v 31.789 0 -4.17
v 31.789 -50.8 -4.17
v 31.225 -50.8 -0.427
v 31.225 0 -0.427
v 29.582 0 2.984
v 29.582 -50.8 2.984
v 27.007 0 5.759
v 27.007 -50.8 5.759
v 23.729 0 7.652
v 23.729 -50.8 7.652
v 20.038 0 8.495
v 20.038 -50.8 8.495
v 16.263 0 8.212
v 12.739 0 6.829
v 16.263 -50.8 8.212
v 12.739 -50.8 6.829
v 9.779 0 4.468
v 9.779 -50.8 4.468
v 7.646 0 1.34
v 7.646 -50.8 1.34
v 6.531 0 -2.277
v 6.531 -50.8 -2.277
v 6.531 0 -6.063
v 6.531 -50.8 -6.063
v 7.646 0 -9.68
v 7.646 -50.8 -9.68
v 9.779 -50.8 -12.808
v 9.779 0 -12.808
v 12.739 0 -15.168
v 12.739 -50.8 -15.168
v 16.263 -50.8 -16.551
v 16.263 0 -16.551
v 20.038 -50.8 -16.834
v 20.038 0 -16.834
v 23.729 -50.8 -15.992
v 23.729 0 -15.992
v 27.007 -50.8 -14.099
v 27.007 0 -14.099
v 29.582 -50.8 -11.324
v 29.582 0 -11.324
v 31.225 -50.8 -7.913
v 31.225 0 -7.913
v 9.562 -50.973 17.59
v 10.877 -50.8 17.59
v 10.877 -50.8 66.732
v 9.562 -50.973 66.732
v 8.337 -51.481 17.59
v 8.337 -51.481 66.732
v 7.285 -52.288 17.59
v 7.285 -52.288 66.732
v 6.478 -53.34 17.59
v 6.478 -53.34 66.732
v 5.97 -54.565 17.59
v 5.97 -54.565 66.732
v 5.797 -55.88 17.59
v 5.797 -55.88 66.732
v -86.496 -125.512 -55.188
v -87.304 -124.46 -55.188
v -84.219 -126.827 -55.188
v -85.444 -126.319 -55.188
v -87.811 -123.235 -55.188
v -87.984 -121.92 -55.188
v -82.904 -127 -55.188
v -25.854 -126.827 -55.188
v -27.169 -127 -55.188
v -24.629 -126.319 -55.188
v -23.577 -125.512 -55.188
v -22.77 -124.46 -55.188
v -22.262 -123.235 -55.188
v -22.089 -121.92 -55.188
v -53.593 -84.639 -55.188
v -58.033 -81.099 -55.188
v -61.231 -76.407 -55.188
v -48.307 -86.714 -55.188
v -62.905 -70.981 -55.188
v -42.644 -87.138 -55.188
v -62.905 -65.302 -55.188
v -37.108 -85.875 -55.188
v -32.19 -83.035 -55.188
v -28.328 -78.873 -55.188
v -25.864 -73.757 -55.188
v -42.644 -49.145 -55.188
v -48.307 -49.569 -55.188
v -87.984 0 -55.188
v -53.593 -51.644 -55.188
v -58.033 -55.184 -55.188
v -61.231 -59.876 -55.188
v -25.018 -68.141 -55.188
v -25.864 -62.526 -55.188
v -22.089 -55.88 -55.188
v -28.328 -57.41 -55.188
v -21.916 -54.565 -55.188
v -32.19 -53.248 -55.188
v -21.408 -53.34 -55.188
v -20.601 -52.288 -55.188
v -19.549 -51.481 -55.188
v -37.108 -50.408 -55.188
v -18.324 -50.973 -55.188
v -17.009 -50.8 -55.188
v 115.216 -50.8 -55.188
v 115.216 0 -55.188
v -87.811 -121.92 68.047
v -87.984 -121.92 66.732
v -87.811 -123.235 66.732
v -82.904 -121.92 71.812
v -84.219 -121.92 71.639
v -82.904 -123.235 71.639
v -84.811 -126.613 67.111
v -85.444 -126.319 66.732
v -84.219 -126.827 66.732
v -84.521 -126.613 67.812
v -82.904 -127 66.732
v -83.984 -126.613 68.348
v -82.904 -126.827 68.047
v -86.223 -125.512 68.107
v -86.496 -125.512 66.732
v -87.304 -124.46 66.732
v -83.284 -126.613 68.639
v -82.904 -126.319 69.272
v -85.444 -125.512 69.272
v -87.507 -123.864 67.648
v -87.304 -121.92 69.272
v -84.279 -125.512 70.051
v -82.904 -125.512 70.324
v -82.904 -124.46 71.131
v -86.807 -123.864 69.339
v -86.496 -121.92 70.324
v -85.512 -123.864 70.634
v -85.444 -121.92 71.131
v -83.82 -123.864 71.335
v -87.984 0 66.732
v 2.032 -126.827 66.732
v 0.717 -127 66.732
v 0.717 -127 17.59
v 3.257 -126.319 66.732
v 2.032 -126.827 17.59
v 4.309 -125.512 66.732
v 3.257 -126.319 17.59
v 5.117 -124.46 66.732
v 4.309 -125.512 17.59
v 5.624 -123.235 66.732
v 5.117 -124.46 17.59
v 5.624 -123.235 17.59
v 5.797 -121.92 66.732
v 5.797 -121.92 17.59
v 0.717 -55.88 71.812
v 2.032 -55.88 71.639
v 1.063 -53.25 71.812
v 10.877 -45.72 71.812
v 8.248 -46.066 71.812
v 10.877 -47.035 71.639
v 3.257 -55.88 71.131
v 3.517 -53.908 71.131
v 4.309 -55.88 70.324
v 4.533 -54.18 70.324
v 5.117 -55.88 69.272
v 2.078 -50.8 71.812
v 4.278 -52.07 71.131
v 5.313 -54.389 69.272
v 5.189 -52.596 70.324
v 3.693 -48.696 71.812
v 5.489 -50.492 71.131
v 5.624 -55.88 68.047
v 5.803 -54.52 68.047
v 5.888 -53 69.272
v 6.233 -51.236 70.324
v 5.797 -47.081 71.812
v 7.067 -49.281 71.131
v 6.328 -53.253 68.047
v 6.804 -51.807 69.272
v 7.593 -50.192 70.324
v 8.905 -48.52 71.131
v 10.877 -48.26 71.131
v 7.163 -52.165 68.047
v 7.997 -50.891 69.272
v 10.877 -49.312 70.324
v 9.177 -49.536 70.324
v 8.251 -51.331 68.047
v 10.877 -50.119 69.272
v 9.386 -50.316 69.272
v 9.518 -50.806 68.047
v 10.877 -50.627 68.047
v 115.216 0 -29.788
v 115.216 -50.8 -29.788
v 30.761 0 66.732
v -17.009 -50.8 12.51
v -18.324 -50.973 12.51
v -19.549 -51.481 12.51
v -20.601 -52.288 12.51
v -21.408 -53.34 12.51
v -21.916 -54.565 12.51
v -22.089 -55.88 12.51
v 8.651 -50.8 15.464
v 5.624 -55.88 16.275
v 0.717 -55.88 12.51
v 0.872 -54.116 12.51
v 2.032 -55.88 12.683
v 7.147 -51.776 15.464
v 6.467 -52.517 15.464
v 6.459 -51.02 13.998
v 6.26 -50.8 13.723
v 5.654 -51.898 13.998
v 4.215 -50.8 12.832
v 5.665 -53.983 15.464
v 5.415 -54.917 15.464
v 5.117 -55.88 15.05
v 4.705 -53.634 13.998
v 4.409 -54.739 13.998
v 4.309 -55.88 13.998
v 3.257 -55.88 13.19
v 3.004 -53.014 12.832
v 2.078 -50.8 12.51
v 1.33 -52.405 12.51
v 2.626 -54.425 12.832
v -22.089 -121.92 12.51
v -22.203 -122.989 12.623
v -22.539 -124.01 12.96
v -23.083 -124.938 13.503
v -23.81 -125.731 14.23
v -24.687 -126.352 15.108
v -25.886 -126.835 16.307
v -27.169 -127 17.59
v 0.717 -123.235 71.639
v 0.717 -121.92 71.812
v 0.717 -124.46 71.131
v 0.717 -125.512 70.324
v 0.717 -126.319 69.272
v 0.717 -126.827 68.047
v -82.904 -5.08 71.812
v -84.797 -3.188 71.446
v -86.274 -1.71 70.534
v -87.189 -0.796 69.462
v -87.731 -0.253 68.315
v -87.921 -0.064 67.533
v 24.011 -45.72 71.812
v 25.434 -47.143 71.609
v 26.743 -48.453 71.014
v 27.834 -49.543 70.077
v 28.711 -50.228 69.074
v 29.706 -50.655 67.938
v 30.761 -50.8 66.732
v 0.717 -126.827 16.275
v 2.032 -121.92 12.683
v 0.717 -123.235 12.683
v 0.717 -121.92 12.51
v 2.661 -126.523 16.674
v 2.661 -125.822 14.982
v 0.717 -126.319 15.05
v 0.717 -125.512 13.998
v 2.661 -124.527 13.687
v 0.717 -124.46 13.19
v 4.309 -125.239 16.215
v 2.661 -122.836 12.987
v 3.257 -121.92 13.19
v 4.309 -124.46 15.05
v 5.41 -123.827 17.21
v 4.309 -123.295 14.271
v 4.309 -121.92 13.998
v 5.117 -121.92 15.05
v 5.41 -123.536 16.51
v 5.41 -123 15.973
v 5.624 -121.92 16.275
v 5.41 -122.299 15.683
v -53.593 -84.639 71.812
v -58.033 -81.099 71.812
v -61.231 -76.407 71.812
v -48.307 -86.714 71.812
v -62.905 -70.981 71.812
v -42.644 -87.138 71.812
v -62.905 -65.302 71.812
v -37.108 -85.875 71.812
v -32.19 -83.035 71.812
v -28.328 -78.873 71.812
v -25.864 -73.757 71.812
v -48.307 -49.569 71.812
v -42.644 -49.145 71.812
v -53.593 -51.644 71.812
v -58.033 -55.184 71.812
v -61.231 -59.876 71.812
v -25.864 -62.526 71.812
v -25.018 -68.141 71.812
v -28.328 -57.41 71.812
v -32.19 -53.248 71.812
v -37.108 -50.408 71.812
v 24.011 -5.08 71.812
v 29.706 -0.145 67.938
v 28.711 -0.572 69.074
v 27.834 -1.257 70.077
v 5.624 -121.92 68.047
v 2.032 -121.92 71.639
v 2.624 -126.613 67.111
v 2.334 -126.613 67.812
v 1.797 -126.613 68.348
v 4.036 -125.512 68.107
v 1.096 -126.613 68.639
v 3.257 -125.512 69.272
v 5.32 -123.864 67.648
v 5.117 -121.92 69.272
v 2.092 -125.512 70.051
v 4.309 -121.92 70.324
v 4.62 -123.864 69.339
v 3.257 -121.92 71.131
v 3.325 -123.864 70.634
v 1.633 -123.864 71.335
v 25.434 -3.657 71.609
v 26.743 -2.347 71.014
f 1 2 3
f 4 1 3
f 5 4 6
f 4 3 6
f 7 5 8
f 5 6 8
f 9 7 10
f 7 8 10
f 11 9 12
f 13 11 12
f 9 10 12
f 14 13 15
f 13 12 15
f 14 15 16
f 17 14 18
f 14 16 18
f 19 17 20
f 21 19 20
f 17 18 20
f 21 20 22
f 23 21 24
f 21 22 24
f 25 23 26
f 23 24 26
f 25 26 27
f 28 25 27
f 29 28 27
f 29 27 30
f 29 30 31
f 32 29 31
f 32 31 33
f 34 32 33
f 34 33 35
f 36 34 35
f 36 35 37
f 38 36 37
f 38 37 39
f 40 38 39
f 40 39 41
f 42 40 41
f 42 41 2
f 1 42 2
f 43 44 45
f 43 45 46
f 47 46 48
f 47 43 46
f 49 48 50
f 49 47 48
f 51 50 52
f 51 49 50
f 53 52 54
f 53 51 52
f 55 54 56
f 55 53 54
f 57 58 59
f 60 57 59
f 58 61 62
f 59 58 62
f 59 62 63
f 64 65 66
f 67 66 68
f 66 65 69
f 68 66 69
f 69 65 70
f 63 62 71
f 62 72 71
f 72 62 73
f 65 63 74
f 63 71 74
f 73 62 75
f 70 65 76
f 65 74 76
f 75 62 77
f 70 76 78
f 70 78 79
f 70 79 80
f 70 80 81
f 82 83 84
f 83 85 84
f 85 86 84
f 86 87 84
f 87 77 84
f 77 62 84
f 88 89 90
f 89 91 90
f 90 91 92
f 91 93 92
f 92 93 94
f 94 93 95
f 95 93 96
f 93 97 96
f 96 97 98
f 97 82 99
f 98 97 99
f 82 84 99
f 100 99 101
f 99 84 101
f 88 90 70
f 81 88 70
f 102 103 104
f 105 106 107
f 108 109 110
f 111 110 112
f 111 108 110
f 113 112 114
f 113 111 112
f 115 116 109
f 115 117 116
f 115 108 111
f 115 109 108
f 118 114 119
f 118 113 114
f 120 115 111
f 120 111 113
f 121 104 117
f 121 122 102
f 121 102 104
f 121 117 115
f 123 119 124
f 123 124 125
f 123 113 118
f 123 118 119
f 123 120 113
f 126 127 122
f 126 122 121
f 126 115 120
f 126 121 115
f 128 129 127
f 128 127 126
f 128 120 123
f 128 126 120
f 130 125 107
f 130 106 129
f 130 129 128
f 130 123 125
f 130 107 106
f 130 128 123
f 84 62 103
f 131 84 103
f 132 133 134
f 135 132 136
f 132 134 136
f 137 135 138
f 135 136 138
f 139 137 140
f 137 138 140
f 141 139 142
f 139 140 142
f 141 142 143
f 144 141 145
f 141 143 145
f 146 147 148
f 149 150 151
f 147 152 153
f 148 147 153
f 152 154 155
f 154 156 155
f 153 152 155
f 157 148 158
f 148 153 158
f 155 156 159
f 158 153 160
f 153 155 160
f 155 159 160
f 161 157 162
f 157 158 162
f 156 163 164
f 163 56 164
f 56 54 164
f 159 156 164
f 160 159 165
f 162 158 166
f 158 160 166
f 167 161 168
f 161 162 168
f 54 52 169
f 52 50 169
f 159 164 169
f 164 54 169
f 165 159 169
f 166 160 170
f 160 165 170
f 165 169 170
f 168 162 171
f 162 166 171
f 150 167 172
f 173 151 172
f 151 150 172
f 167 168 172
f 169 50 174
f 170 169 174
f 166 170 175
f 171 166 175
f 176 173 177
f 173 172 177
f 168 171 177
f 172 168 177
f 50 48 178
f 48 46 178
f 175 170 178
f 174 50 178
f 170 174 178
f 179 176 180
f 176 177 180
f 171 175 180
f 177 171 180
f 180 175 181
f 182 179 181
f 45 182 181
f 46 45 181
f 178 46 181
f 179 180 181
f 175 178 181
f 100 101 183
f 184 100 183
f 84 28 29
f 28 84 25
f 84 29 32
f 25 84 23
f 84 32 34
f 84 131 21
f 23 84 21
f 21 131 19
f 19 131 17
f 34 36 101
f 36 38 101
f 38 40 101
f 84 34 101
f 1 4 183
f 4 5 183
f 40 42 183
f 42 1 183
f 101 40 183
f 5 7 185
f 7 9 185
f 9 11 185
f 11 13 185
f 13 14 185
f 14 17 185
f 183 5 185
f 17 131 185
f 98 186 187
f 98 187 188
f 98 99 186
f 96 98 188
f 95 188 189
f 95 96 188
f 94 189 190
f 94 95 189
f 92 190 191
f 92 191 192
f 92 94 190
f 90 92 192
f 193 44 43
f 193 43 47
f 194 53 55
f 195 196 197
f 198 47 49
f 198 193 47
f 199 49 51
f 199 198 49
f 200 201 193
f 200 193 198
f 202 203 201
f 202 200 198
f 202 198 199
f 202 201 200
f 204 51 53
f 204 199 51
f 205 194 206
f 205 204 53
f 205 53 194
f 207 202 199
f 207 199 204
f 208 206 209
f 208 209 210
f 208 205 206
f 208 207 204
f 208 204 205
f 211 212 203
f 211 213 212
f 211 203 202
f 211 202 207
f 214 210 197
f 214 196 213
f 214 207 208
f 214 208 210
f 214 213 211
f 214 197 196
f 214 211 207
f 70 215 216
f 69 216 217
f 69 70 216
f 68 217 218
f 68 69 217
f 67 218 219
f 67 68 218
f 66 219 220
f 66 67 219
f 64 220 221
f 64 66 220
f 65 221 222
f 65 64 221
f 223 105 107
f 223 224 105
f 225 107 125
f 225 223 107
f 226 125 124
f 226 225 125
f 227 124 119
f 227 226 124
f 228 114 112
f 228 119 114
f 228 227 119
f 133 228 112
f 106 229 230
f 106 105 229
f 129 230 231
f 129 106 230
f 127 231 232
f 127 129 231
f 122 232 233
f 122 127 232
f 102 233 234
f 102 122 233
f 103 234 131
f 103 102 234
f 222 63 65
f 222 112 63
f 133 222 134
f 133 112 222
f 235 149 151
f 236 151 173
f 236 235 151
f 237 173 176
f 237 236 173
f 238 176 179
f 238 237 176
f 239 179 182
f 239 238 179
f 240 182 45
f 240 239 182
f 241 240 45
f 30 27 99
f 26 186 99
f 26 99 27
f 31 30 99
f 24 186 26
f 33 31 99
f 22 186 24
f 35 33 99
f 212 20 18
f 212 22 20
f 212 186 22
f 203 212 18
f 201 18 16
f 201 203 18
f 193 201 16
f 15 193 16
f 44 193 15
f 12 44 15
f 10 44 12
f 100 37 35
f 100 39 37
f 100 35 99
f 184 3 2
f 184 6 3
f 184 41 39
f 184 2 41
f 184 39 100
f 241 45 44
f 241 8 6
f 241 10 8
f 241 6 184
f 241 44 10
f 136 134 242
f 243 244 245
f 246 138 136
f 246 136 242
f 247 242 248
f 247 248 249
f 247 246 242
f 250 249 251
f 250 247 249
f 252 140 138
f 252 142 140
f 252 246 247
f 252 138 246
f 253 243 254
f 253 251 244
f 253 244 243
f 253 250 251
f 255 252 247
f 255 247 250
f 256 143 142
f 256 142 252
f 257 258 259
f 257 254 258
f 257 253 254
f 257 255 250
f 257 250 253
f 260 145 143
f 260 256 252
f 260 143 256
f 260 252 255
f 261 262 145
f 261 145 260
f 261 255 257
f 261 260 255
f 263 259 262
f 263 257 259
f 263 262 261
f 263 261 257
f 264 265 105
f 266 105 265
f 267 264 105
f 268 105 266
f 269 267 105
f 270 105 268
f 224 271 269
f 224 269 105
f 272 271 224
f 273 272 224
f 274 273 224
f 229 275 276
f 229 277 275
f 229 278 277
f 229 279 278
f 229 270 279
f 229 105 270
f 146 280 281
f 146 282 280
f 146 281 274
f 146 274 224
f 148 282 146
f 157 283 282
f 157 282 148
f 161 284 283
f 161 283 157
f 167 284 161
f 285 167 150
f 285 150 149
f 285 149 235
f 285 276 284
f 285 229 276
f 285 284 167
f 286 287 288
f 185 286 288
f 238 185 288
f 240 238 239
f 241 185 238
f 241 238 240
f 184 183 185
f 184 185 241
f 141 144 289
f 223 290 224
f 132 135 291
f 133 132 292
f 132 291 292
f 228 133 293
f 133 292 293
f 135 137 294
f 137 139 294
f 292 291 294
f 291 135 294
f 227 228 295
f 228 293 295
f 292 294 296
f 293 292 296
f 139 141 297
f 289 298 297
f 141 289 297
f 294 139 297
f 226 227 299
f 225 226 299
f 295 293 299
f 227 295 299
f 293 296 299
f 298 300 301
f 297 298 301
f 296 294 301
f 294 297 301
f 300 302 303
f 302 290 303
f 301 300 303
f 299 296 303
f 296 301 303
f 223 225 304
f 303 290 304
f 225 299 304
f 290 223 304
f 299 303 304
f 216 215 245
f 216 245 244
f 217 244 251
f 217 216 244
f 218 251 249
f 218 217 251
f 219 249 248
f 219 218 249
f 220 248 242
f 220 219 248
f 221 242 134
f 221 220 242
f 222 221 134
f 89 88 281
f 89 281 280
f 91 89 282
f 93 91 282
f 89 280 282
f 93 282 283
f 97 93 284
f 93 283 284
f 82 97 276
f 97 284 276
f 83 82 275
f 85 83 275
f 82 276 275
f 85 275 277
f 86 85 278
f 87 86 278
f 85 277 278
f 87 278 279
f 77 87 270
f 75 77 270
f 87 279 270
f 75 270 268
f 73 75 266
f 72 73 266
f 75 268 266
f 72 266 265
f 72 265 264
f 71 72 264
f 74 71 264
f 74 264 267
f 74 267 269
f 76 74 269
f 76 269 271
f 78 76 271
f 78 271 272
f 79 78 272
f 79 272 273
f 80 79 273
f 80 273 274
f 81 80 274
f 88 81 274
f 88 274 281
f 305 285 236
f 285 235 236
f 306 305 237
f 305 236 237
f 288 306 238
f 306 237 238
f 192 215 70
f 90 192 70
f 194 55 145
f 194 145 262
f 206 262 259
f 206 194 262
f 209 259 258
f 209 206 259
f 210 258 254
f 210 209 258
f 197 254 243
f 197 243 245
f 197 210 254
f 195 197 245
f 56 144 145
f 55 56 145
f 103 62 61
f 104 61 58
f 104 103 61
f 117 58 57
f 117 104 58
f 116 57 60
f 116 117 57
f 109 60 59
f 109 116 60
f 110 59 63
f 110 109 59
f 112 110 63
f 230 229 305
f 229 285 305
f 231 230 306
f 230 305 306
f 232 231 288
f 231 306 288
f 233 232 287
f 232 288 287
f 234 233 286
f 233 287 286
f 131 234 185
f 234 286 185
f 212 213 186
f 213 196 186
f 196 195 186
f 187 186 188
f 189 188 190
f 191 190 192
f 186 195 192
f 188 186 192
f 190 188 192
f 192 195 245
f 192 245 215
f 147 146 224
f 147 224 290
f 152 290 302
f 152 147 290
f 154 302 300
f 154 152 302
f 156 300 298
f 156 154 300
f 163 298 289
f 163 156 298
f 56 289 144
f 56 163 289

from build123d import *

# Parameters (mm, degrees)
F0_W         = 203.2
F0_H         = 127
F1_DEPTH     = 127
F3_DEPTH     = 76.2
F4_SIZE2     = 101.6
F4_SIZE      = 88.9
F5_F1_R      = 5.08
F5_F2_R      = 5.08
F6_T1_DEPTH  = 66.04
F6_S5_W      = 5.1816
F6_S5_H      = 5.1816
F6_T6_DEPTH  = 5.1816
F6_T12_ANGLE = 233.2969892374
F7_R         = 12.7
F8_DEPTH     = 50.801
F9_R         = 19.05
F10_DEPTH    = 127.0010001


# Not quite as in the source:
# - a fillet or chamfer that OpenCascade refuses, or shapes differently, is made with other operations: its cross-section is extruded or revolved along the edge and cut away or added


with BuildPart() as f1:
    # F0 (on Front) → F1 (new body)
    with BuildSketch(Plane.XZ):
        with Locations((13.6157348752, 8.31202526)):
            Rectangle(F0_W, F0_H)
    extrude(amount=F1_DEPTH)

    # F2 (on face) → F3 (cut)
    with BuildSketch(Plane.XZ.offset(127)):
        Polygon((115.2157348752, 71.81202526), (5.7971677743, 71.81202526), (5.7971677743, 12.5097064301), (-22.089054808, 12.5097064301), (-22.089054808, -55.18797474), (115.2157348752, -55.18797474), align=None)
    extrude(amount=-F3_DEPTH, mode=Mode.SUBTRACT)

    # F4
    f4_edges = [f1.edges().sort_by_distance(p)[0] for p in [
        (115.215735, -25.4, 71.812025),
    ]]
    f4_side = f1.faces().sort_by_distance((-8.764887, -51.376752, 71.812025))[0]
    chamfer(f4_edges, length=F4_SIZE, length2=F4_SIZE2, reference=f4_side)

    # F5: fillet of radius 5.08 on 11 edges, made by hand

    # F5_f1
    f5_f1_edges = [f1.edges().sort_by_distance(p)[0] for p in [
        (5.7971677743, -50.8, 42.1608658451),
        (-22.089054808, -50.8, -21.3391341549),
    ]]
    fillet(f5_f1_edges, radius=F5_F1_R)

    # F5_f2
    f5_f2_edges = [f1.edges().sort_by_distance(p)[0] for p in [
        (5.7971677743, -91.44, 71.81202526),
        (5.7971677743, -127, 42.1608658451),
        (26.3157348752, -25.4, 71.81202526),
        (-30.8342651248, 0, 71.81202526),
        (-87.9842651248, -63.5, 71.81202526),
        (-8.1459435169, -127, 12.5097064301),
        (-22.089054808, -127, -21.3391341549),
        (-87.9842651248, -127, 8.31202526),
        (-41.0935486753, -127, 71.81202526),
        (7.2850653259, -52.2878975516, 71.81202526),
    ]]
    fillet(f5_f2_edges, radius=F5_F2_R)

    # F6: fillet of radius 5.08 on 2 edges, made by hand

    # F6_s2 → F6_t1 (cut)
    with BuildSketch(Plane.XZ.offset(55.88)):
        with BuildLine():
            ThreePointArc((5.7971677743, 17.5897064301), (4.3092702227, 13.9976039817), (0.7171677743, 12.5097064301))
            Line((0.7171677743, 12.5097064301), (5.7971677743, 12.5097064301))
            Line((5.7971677743, 12.5097064301), (5.7971677743, 17.5897064301))
        make_face()
    extrude(amount=F6_T1_DEPTH, mode=Mode.SUBTRACT)


with BuildPart() as f6_tool4:
    # F6_s5 → F6_t6 (new body)
    with BuildSketch(Plane.YZ.offset(0.7171677743)):
        with Locations((-124.5108, 14.9989064301)):
            Rectangle(F6_S5_W, F6_S5_H)
    extrude(amount=F6_T6_DEPTH)

    # F6_s7 → F6_t8 (revolve, cut)
    with BuildSketch(Plane(origin=(0.7171677743, -121.92, 17.5897064301), x_dir=(0, 0.7071067812, 0.7071067812), z_dir=(0, 0.7071067812, -0.7071067812))):
        with BuildLine():
            ThreePointArc((0, -5.08), (5.08, 0), (0, 5.08))
            Line((0, 5.08), (0, -5.08))
        make_face()
    revolve(axis=Axis((0.7171677743, -121.92, 17.5897064301), (1, 0, 0)), mode=Mode.SUBTRACT)


with BuildPart() as f1_1:
    add(f1.part)

    # F6_t3: cut F6_tool4
    add(f6_tool4.part, mode=Mode.SUBTRACT)


with BuildPart() as f6_tool10:
    # F6_s11 → F6_t12 (revolve)
    with BuildSketch(Plane(origin=(-19.784595187, -14.7486000708, 0), x_dir=(0, 0, 1), z_dir=(-0.8017442393, -0.5976672776, 0))):
        with BuildLine():
            ThreePointArc((17.5897064301, -56.382395344), (13.9976039817, -57.8702928955), (12.5097064301, -61.462395344))
            Line((12.5097064301, -61.462395344), (12.5097064301, -56.382395344))
            Line((12.5097064301, -56.382395344), (17.5897064301, -56.382395344))
        make_face()
    revolve(axis=Axis((10.8771677743, -55.88, 12.5097064301), (0, 0, 1)), revolution_arc=F6_T12_ANGLE)

    split(bisect_by=Plane.XZ.offset(50.8), keep=Keep.TOP)


with BuildPart() as f1_2:
    add(f1_1.part)

    # F6_t9: cut F6_tool10
    add(f6_tool10.part, mode=Mode.SUBTRACT)

    # F7 (on face) → F8 (cut, through all)
    with BuildSketch(Plane.XZ.offset(50.8)):
        with Locations((19.088730216, -4.1699022986)):
            Circle(F7_R)
    extrude(amount=-F8_DEPTH, mode=Mode.SUBTRACT)

    # F9 (on face) → F10 (cut, through all)
    with BuildSketch(Plane.XY.offset(71.81202526)):
        with Locations((-44.067915529, -68.1414976716)):
            Circle(F9_R)
    extrude(amount=-F10_DEPTH, mode=Mode.SUBTRACT)


solid = f1_2.part
